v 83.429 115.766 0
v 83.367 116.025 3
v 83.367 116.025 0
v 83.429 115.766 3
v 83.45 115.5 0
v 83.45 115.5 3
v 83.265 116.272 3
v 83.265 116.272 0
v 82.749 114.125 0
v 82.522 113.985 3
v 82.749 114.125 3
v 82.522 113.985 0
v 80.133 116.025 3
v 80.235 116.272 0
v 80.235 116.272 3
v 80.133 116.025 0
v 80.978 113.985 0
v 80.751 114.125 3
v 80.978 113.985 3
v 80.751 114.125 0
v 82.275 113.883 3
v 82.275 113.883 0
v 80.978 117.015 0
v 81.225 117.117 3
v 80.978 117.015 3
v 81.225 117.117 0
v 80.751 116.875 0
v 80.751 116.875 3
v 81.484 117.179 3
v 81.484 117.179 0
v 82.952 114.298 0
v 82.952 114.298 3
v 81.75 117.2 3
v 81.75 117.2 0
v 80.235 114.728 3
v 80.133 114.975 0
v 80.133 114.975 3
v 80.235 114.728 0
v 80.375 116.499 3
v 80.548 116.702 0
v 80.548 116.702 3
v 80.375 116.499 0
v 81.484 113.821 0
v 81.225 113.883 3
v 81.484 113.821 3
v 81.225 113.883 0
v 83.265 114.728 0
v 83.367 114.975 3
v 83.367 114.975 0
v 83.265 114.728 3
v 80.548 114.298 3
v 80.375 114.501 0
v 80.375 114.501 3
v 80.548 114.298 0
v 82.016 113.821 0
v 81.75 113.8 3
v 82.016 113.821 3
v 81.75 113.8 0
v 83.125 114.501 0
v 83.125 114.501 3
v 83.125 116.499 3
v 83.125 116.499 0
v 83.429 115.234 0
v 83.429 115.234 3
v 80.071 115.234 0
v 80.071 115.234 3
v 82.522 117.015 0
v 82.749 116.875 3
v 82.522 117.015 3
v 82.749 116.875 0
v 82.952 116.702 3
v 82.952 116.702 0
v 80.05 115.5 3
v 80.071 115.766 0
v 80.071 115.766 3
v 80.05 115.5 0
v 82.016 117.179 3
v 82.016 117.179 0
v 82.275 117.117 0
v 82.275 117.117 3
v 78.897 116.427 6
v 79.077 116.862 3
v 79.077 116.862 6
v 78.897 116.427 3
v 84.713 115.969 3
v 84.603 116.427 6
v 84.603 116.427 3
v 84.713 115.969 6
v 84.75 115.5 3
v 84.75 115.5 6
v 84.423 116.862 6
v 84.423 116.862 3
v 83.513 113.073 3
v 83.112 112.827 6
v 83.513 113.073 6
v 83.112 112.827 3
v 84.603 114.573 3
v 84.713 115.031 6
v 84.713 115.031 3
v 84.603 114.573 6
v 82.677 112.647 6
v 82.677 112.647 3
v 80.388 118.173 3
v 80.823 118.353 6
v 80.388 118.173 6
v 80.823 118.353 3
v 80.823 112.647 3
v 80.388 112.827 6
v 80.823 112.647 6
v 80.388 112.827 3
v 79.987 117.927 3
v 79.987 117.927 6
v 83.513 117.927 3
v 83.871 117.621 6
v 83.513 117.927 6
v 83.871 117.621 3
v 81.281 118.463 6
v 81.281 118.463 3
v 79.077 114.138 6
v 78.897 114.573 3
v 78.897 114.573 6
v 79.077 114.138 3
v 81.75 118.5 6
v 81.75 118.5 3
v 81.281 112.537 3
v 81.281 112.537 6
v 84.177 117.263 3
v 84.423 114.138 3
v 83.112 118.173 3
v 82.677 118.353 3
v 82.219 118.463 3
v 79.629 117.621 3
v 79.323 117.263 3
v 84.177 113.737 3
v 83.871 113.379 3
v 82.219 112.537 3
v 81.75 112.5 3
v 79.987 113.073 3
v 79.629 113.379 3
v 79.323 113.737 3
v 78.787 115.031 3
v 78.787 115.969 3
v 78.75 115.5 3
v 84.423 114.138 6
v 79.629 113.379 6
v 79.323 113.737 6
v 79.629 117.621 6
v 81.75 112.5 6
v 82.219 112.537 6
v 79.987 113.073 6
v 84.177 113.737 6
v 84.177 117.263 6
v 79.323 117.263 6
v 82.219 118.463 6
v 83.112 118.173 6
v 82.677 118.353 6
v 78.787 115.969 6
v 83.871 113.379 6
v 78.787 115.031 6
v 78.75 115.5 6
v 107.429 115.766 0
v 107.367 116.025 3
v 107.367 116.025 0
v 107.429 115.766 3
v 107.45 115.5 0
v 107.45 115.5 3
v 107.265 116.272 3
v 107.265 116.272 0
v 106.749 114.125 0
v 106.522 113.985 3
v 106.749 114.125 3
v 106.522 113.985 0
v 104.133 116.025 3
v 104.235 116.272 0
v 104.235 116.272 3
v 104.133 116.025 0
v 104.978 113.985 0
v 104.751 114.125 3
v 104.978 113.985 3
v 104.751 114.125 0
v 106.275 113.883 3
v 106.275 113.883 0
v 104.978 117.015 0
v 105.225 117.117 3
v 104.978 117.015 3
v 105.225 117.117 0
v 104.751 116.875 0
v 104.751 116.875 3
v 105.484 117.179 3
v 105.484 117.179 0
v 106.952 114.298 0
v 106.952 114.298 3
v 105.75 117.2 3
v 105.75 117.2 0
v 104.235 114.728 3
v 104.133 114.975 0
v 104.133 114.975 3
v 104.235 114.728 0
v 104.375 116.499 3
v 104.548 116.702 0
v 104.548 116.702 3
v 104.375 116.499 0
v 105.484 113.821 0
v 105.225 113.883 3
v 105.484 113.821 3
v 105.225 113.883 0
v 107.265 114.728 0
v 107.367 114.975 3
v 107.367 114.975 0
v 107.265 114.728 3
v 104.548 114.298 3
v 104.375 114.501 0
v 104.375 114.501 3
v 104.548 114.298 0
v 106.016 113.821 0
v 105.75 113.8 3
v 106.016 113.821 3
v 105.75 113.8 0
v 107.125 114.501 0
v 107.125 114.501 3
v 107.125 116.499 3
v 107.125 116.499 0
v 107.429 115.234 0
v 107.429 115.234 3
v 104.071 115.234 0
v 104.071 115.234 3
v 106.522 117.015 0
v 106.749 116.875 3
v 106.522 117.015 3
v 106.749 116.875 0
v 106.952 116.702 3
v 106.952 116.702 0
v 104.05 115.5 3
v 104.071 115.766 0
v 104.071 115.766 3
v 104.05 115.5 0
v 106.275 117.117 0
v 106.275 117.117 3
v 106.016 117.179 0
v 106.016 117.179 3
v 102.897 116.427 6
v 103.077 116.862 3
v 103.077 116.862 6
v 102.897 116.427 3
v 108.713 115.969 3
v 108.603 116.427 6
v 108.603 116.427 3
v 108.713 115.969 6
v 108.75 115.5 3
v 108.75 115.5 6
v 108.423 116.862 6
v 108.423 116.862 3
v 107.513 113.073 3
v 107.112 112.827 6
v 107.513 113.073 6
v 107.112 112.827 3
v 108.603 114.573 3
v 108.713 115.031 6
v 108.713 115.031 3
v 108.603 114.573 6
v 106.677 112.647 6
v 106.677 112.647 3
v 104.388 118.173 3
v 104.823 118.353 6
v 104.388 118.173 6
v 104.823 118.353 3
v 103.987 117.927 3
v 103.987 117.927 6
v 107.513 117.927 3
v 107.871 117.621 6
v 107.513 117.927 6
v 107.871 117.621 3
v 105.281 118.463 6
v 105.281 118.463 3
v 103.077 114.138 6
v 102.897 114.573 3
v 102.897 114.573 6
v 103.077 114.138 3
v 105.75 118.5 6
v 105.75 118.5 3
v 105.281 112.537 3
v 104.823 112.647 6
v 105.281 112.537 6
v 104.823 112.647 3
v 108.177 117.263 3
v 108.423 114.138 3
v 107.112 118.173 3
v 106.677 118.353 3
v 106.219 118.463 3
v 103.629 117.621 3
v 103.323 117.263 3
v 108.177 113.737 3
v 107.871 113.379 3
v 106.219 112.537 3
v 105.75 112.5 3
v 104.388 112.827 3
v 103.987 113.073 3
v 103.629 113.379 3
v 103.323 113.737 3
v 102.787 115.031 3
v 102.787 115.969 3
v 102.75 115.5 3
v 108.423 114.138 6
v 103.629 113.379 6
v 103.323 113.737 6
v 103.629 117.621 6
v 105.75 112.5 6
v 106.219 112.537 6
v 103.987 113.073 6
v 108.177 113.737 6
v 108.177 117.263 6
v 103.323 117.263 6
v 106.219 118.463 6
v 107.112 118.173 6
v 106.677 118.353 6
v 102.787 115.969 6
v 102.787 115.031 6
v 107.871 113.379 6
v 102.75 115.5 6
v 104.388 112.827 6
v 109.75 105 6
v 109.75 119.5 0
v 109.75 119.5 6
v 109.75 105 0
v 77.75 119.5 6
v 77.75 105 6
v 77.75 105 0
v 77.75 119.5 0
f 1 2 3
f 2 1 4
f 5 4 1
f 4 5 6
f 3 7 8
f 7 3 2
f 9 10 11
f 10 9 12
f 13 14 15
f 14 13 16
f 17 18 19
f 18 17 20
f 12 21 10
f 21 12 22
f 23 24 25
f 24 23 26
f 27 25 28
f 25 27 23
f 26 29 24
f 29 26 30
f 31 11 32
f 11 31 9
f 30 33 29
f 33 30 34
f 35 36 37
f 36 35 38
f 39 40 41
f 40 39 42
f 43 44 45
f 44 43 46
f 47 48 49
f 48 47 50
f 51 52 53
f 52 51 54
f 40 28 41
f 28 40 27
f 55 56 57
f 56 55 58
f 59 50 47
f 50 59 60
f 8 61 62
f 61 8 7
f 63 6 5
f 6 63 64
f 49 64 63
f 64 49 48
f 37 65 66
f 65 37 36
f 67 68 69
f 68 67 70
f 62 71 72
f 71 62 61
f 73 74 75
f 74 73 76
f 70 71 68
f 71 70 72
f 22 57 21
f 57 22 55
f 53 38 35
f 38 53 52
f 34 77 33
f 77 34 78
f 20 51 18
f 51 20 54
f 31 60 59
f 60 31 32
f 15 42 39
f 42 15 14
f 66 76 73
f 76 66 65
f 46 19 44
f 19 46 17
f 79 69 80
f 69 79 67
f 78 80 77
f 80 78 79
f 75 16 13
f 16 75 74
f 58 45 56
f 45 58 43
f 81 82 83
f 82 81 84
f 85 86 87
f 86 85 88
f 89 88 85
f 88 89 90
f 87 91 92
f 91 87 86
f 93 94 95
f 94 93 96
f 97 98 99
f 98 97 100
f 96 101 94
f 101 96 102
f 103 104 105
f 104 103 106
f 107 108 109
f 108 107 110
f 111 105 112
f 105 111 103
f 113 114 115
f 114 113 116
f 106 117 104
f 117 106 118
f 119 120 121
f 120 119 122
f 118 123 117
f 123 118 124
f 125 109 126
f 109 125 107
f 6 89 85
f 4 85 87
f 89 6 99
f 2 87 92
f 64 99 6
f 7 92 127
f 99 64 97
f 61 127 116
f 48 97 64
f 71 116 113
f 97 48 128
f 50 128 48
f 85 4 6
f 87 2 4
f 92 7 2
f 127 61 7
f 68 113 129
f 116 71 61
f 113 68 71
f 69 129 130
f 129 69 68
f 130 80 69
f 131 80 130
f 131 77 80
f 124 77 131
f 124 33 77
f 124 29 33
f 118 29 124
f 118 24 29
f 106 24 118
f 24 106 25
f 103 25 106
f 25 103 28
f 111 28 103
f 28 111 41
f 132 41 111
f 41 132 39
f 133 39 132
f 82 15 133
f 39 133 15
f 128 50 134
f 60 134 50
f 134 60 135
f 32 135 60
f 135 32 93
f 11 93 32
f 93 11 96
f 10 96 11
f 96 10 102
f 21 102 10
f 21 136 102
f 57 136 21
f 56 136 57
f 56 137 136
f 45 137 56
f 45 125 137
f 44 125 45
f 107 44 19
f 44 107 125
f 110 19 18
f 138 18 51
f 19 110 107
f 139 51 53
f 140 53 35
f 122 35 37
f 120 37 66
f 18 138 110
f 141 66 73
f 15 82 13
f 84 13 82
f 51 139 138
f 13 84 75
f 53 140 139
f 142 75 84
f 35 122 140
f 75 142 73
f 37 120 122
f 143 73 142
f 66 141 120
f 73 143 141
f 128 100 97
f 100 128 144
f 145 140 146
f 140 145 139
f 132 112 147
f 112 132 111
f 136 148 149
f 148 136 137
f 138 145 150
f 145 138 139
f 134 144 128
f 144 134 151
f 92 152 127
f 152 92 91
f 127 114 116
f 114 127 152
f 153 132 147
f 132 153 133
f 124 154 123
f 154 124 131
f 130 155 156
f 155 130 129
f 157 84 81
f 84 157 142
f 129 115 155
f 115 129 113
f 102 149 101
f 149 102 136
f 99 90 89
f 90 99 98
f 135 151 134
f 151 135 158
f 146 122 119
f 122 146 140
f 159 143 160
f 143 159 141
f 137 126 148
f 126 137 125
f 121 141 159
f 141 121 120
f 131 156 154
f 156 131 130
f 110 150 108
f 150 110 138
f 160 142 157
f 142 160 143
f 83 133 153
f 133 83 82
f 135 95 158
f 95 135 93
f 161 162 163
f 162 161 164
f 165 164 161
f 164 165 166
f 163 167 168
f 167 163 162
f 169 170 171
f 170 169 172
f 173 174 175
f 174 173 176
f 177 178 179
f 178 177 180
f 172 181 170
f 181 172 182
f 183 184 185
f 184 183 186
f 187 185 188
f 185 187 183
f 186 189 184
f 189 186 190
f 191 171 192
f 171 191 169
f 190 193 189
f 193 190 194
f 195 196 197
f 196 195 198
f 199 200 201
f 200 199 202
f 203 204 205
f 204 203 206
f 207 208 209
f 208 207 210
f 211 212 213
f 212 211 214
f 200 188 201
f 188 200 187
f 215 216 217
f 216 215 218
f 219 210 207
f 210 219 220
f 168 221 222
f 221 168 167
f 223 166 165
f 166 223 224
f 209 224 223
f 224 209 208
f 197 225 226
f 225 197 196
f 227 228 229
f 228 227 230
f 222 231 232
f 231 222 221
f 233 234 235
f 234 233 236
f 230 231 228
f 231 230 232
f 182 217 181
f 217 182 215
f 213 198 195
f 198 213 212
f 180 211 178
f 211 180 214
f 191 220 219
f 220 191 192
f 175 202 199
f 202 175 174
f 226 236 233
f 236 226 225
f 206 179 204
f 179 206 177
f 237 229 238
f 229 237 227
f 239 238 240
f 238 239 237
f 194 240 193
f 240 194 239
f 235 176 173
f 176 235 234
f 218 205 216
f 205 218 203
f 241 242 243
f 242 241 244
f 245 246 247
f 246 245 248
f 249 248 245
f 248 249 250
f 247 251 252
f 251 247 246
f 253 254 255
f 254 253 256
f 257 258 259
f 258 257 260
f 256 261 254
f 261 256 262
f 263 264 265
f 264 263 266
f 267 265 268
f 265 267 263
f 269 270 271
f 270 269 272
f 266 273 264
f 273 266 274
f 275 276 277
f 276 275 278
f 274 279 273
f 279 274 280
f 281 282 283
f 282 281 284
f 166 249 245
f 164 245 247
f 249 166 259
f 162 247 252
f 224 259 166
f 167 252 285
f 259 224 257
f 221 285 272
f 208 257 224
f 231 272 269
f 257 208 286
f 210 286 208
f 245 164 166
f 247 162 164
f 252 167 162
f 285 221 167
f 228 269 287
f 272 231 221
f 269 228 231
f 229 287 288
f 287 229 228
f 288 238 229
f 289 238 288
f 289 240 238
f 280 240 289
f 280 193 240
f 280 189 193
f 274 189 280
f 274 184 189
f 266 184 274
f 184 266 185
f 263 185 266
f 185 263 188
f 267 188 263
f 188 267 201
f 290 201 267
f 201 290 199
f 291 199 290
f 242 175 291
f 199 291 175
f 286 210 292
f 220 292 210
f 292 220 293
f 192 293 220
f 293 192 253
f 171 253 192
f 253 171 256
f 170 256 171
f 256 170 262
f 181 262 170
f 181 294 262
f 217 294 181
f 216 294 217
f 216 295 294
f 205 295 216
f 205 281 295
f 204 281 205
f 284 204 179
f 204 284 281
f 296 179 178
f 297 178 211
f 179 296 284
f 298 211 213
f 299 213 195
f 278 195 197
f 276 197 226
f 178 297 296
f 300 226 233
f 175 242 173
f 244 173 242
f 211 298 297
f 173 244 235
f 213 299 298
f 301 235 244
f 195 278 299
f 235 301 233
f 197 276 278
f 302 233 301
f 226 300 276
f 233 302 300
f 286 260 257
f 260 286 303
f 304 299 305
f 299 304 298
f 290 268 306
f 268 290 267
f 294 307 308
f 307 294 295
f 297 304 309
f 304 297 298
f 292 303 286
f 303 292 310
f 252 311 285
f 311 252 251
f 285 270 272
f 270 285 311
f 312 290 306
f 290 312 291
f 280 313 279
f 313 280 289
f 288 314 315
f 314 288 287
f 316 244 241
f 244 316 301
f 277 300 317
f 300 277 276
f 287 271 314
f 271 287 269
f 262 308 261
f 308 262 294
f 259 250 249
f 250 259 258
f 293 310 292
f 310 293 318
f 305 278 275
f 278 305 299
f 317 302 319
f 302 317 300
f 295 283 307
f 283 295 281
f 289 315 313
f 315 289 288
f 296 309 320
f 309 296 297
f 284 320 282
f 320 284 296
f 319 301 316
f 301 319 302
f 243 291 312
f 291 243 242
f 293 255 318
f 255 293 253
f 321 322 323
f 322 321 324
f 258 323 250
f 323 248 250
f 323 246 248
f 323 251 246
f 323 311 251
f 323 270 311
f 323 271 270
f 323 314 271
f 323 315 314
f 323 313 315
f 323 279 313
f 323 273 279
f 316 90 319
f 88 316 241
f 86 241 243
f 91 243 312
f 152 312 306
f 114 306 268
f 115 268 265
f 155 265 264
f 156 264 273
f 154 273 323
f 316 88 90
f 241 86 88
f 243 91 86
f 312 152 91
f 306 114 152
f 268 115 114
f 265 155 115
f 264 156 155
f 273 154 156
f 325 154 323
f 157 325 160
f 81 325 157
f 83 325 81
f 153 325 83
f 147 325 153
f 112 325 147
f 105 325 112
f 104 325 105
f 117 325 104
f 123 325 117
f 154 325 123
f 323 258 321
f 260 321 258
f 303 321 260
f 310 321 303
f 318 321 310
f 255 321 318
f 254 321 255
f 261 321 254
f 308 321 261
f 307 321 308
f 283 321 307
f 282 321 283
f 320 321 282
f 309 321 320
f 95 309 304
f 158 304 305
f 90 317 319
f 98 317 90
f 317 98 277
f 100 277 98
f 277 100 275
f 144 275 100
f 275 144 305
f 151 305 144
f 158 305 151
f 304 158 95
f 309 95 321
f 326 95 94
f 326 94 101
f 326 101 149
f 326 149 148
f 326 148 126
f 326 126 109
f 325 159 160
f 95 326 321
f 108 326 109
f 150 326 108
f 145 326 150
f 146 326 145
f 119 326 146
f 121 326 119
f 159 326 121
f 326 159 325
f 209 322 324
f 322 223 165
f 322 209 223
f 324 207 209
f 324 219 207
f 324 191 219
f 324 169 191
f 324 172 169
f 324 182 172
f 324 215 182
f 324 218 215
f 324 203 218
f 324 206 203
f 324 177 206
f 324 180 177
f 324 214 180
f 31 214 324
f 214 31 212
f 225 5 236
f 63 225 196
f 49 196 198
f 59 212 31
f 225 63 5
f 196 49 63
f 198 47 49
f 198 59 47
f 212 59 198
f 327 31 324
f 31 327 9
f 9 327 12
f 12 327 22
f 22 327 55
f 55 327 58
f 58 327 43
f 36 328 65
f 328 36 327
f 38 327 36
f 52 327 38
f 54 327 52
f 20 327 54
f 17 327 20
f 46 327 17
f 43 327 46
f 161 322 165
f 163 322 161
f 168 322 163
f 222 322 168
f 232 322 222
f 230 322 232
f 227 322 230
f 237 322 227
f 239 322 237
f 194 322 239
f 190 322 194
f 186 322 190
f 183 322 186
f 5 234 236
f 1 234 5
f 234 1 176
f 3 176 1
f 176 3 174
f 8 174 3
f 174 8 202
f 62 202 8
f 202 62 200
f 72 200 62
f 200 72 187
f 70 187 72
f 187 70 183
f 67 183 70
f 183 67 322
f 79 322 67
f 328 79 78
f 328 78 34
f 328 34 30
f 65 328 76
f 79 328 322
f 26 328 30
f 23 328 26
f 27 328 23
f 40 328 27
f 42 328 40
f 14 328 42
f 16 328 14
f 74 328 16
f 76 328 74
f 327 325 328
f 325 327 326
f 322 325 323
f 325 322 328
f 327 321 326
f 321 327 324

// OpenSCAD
include <../lib/pouch-comms-module-lib.scad>;
$fn = 40;
clamp_print();
